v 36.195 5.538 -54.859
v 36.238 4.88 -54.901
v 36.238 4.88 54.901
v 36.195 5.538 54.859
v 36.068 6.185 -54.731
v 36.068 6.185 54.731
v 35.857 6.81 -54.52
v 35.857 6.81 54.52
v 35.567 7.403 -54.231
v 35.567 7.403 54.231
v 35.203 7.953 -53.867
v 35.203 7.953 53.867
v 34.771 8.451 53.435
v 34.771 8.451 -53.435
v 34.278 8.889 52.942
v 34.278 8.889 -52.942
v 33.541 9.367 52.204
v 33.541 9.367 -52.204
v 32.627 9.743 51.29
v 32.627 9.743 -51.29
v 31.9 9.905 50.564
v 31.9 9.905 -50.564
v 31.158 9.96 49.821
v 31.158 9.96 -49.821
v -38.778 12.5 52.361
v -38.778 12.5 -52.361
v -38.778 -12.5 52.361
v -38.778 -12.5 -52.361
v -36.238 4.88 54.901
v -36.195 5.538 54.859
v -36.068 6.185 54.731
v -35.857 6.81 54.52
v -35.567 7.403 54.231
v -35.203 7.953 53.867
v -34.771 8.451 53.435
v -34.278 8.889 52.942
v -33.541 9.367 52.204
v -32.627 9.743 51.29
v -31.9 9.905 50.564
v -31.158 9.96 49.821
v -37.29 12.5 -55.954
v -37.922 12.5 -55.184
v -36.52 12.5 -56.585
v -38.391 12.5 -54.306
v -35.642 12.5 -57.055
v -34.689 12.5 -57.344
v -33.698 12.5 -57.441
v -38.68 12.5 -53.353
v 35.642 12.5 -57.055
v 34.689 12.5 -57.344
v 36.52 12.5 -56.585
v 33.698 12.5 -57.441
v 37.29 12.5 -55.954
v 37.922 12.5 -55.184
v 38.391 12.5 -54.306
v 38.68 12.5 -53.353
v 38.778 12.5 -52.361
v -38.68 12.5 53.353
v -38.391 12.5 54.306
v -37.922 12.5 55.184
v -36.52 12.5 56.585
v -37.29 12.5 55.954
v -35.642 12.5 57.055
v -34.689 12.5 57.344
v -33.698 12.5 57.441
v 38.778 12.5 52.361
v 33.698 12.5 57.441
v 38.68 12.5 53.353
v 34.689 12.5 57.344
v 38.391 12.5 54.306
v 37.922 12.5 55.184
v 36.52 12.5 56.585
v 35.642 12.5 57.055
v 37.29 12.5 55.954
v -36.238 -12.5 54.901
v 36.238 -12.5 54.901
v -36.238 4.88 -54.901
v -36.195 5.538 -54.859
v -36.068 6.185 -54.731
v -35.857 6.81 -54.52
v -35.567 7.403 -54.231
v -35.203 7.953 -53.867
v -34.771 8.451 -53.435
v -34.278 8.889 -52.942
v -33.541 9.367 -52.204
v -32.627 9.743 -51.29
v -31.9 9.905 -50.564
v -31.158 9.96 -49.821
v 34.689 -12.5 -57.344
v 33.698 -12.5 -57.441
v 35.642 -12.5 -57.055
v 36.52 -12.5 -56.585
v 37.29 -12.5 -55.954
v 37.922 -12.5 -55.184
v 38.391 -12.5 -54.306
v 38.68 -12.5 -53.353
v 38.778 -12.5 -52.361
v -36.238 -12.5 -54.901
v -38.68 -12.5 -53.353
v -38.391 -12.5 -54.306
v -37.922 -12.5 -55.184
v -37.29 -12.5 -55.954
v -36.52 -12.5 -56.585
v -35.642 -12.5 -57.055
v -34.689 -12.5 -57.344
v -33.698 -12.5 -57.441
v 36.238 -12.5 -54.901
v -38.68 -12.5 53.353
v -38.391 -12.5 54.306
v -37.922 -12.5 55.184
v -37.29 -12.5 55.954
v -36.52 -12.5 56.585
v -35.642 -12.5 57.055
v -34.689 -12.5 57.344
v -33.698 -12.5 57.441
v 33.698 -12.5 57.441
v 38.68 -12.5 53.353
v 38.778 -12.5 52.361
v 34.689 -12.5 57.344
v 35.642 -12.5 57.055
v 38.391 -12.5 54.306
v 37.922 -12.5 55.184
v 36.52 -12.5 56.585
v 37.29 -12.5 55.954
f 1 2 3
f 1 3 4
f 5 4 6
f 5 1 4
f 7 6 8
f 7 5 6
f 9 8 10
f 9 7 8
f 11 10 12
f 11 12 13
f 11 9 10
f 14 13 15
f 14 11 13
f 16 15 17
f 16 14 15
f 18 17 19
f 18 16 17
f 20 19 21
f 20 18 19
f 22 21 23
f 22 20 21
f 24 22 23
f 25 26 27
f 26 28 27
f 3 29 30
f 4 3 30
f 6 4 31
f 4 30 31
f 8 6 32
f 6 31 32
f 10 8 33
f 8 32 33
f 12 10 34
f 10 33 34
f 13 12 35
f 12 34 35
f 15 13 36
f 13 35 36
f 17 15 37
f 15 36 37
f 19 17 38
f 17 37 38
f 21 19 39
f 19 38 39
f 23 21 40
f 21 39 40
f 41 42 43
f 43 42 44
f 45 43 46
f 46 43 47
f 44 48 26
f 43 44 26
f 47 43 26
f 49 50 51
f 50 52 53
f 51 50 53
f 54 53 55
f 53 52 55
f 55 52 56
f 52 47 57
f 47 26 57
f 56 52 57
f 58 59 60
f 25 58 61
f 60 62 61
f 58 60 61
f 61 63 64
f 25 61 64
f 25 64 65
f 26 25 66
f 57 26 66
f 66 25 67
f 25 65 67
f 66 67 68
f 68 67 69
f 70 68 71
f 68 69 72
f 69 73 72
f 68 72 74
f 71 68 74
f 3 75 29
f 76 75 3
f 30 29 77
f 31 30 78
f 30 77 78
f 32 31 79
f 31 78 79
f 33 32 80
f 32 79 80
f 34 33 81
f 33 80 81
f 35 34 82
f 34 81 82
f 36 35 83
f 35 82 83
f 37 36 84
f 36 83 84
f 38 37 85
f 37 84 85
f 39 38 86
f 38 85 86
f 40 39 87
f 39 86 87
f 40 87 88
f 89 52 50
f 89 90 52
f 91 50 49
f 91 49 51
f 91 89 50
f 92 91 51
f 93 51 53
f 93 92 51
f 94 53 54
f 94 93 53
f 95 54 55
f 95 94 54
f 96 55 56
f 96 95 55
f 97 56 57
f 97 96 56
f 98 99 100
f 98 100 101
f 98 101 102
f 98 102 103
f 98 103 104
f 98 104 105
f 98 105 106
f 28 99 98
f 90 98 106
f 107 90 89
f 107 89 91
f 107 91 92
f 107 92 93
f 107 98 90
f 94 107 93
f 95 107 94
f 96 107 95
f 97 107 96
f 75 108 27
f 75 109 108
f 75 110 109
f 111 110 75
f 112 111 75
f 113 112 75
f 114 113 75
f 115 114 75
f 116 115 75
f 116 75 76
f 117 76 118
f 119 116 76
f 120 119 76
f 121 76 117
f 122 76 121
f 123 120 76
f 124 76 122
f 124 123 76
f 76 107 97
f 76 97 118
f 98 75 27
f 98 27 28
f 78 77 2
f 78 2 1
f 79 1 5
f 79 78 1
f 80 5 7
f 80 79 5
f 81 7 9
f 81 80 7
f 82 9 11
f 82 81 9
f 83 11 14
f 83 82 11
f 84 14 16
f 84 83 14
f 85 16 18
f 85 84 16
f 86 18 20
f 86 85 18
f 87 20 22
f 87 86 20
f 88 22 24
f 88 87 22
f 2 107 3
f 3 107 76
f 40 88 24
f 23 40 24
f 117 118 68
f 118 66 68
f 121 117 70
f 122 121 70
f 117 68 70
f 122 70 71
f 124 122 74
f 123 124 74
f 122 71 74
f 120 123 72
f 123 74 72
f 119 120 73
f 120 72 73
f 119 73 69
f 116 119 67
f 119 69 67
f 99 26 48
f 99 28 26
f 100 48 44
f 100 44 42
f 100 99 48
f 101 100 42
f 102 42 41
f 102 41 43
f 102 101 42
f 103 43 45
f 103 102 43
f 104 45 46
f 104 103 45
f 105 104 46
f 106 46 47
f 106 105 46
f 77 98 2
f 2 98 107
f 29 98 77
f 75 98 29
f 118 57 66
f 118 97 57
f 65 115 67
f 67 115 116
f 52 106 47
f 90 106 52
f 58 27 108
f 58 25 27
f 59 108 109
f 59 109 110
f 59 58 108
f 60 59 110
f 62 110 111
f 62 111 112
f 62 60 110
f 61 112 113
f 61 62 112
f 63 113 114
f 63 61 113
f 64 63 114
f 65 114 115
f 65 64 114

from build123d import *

# Parameters (mm, degrees)
F0_W     = 77.5562152267
F0_H     = 114.8829683661
F1_DEPTH = 12.5
F2_T     = -2.54
F3_R     = 5.08
F4_R     = 5.08


with BuildPart() as f1:
    # F0 (on Front) → F1 (new body, symmetric)
    with BuildSketch(Plane.XZ):
        Rectangle(F0_W, F0_H)
    extrude(amount=F1_DEPTH, both=True)

    # F2
    f2_openings = [f1.faces().sort_by_distance(p)[0] for p in [
        (0, -12.5, 0),
    ]]
    offset(amount=F2_T, openings=f2_openings)

    # F3
    f3_edges = [f1.edges().sort_by_distance(p)[0] for p in [
        (0, 9.96, -54.901484),
        (36.238108, 9.96, 0),
        (0, 9.96, 54.901484),
        (-36.238108, 9.96, 0),
    ]]
    fillet(f3_edges, radius=F3_R)

    # F4
    f4_edges = [f1.edges().sort_by_distance(p)[0] for p in [
        (-38.778108, 0, 57.441484),
        (38.778108, 0, 57.441484),
        (38.778108, 0, -57.441484),
        (-38.778108, 0, -57.441484),
    ]]
    fillet(f4_edges, radius=F4_R)


solid = f1.part
